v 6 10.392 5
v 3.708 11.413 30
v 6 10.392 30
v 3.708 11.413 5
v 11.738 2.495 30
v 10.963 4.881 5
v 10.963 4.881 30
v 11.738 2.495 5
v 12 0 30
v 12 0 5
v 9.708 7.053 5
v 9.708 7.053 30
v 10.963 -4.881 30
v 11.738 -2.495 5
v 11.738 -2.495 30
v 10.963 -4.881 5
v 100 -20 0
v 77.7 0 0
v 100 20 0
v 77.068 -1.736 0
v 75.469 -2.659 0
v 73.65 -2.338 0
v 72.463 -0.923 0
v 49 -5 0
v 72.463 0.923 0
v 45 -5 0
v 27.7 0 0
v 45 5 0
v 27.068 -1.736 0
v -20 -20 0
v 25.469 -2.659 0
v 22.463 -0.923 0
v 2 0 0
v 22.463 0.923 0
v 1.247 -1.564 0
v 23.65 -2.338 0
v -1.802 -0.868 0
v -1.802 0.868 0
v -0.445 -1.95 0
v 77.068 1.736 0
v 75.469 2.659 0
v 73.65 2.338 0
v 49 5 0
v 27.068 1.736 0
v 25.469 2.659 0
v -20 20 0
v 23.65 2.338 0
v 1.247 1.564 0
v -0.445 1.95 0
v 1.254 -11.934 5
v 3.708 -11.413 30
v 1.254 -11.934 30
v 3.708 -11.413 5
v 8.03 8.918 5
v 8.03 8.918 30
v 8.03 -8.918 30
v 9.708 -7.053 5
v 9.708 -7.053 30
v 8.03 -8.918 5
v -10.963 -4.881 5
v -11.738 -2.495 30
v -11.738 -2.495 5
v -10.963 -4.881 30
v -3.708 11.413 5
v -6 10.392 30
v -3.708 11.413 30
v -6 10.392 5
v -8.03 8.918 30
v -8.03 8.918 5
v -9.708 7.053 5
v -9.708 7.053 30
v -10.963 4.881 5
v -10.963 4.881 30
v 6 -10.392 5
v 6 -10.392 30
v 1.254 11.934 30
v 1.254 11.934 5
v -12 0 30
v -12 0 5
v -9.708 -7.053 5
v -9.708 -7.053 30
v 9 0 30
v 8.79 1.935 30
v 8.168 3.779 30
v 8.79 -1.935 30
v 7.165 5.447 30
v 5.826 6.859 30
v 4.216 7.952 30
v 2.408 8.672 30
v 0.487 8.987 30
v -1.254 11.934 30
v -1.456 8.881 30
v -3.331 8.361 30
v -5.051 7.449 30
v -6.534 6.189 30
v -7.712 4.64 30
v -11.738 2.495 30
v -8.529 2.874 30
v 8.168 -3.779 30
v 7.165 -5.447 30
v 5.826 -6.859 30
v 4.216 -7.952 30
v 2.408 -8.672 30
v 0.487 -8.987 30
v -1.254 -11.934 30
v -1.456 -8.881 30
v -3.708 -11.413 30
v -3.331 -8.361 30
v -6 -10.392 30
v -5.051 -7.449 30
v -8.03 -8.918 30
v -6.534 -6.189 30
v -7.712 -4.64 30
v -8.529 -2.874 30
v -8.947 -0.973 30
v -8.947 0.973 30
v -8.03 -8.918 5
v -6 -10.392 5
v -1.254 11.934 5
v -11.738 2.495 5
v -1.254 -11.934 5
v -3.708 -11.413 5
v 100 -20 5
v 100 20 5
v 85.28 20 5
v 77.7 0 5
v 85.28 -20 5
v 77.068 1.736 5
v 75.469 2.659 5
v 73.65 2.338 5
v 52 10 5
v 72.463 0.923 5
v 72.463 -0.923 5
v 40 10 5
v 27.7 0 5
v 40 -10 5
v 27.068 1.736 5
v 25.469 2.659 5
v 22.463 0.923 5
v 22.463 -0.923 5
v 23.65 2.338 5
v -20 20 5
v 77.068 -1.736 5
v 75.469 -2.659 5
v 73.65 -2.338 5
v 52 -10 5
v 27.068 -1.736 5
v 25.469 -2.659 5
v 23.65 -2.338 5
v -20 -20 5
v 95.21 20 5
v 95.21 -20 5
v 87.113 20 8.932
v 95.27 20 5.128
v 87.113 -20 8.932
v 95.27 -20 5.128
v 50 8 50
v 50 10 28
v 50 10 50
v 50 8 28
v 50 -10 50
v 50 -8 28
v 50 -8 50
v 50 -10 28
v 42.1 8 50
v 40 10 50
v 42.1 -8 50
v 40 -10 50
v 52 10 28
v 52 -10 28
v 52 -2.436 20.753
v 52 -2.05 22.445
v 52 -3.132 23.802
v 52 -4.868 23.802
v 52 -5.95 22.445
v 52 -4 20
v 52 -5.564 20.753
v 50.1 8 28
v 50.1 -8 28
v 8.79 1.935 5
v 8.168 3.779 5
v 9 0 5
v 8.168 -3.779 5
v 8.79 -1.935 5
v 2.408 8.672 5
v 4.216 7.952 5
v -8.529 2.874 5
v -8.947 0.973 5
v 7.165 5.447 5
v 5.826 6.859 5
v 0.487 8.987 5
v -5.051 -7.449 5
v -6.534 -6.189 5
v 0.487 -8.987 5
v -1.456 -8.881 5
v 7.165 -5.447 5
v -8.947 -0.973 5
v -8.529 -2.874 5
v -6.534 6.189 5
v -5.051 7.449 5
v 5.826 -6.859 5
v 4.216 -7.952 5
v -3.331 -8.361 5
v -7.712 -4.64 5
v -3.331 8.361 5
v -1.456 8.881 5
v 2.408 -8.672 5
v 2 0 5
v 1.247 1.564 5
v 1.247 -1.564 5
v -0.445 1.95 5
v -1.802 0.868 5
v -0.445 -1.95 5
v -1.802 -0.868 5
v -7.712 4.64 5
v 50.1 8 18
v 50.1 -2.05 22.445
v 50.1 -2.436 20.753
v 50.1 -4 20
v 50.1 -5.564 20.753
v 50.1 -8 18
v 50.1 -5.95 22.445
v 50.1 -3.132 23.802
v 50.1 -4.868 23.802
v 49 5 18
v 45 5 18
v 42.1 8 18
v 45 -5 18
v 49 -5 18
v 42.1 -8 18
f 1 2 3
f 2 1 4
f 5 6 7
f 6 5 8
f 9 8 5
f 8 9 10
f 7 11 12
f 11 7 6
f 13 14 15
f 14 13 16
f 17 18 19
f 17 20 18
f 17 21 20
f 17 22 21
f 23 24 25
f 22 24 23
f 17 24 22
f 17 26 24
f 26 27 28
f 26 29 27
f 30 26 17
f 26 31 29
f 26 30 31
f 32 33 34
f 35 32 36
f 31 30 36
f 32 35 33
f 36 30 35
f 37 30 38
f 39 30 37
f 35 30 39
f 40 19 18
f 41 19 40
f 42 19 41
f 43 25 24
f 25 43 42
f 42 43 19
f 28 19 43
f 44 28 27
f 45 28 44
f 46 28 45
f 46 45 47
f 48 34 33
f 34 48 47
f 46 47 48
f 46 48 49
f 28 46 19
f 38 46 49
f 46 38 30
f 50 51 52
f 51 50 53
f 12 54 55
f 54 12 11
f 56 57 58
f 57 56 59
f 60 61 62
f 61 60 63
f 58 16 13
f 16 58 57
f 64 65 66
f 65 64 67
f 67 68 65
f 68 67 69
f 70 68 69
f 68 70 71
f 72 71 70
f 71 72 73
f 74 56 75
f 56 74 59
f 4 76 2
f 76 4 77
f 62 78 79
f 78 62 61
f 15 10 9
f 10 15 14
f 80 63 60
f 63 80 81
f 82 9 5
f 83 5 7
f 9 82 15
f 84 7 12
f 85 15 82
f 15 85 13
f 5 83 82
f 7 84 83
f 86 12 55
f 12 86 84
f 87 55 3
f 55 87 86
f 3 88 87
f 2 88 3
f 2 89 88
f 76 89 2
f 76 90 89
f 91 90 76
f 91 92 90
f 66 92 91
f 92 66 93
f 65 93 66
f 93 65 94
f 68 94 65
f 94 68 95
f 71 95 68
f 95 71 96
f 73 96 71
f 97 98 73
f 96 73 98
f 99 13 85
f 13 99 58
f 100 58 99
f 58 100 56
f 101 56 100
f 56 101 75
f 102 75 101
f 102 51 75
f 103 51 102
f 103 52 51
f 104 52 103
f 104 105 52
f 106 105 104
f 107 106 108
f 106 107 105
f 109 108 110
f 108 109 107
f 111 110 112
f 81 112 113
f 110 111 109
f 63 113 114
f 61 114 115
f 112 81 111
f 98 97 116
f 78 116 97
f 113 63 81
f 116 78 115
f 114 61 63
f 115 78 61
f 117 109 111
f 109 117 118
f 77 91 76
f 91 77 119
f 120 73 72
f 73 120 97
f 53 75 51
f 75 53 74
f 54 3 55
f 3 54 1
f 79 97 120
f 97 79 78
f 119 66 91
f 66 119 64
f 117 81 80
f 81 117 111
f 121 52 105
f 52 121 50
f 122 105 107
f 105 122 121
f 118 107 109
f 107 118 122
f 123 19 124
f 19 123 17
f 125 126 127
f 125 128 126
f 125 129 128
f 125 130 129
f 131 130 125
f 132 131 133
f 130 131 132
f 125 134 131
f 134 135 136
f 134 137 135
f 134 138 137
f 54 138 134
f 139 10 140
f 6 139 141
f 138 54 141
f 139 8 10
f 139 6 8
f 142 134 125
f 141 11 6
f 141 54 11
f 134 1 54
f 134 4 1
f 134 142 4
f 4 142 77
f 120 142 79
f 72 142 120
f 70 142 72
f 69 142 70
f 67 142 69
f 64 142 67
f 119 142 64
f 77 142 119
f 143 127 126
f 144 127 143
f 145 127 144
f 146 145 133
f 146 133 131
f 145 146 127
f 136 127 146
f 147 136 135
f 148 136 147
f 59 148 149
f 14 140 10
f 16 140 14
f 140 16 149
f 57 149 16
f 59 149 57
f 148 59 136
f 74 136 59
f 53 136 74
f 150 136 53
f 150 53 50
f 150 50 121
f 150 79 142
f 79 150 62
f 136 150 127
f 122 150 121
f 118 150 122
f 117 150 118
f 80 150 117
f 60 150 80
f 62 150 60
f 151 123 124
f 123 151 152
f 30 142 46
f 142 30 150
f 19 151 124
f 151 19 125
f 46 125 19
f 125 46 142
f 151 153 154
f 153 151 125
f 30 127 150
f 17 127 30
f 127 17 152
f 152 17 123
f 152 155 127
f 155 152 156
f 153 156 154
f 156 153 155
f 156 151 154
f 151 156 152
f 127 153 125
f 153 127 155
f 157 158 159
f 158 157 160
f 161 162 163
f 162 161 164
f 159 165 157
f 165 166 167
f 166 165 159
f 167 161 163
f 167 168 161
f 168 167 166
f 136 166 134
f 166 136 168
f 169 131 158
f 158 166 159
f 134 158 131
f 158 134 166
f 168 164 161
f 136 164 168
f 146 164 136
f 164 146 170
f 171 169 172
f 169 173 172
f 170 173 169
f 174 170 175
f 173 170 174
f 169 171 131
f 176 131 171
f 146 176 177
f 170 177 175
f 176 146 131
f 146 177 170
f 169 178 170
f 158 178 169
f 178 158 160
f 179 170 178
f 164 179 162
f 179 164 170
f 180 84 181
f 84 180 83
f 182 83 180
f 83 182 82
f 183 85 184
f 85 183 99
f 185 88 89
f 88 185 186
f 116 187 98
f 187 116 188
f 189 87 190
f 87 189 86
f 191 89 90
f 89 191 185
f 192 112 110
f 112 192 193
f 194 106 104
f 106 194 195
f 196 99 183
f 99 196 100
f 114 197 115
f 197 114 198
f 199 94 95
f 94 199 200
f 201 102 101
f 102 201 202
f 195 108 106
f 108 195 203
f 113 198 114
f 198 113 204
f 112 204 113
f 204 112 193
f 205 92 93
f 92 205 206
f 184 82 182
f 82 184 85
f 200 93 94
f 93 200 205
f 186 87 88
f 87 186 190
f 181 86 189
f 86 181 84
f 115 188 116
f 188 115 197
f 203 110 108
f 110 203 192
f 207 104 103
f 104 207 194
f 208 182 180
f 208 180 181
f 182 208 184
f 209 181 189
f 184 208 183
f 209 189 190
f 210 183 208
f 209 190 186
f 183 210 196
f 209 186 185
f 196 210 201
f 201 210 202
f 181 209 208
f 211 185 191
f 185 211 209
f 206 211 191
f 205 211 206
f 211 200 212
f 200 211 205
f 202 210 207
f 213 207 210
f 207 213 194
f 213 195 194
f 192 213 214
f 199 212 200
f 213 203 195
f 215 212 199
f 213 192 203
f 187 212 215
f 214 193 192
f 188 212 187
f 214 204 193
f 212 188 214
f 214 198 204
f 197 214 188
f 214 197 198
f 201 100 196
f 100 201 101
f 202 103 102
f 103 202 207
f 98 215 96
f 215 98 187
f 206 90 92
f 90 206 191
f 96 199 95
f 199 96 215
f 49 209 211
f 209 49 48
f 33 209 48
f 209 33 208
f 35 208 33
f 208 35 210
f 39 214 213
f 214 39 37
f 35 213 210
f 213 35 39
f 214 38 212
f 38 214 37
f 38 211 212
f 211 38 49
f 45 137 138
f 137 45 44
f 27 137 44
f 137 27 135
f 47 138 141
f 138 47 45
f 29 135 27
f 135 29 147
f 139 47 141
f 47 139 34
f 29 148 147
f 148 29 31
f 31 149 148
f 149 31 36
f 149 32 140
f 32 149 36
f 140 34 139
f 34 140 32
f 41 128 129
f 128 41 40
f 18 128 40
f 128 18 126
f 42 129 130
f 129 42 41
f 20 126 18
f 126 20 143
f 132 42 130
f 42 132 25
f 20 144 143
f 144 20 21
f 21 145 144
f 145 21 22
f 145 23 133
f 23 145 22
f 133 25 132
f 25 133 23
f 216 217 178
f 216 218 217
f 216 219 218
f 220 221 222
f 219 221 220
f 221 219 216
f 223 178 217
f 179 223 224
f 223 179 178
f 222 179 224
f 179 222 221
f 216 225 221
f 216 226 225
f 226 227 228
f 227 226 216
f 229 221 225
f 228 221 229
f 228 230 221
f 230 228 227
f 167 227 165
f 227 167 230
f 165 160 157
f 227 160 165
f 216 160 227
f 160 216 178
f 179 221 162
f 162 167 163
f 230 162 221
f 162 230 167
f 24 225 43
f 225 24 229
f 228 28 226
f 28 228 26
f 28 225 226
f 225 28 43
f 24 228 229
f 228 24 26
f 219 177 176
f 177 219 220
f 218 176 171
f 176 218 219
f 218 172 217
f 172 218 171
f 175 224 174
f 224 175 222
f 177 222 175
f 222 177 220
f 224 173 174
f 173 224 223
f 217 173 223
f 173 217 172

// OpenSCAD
difference() {
    union() {
        cylinder(30, r=12);
        
        translate([-20, -20, 0])
            cube([120, 40, 5]);
        
          
        translate([85, -20, 4.4])
            rotate([0, 25, 0])
                cube([9, 40, 5]);
      
        
        translate([40, -10, 5])
            cube([10, 20, 45]);
         
        translate([50, -10, 5])
            cube([2, 20, 23]);
        
       
    }
    
    union() {
        translate([0,0, 5])
            cylinder(26, r=9);
        
        translate([0,0, -5])
            cylinder(26, r=2);
        
        translate([25, 0, -5])
            cylinder(26, r=2.7);
        
        translate([75, 0, -5])
            cylinder(26, r=2.7);
        
        translate([42.1, -8, 18])
            cube([8, 16, 33]);
        
        translate([45, -5, -1])
            cube([4, 10, 33]);
              
        translate([48, -4, 22])
            rotate([0, 90,0])
                cylinder(5, r=2);

    }

}

 
